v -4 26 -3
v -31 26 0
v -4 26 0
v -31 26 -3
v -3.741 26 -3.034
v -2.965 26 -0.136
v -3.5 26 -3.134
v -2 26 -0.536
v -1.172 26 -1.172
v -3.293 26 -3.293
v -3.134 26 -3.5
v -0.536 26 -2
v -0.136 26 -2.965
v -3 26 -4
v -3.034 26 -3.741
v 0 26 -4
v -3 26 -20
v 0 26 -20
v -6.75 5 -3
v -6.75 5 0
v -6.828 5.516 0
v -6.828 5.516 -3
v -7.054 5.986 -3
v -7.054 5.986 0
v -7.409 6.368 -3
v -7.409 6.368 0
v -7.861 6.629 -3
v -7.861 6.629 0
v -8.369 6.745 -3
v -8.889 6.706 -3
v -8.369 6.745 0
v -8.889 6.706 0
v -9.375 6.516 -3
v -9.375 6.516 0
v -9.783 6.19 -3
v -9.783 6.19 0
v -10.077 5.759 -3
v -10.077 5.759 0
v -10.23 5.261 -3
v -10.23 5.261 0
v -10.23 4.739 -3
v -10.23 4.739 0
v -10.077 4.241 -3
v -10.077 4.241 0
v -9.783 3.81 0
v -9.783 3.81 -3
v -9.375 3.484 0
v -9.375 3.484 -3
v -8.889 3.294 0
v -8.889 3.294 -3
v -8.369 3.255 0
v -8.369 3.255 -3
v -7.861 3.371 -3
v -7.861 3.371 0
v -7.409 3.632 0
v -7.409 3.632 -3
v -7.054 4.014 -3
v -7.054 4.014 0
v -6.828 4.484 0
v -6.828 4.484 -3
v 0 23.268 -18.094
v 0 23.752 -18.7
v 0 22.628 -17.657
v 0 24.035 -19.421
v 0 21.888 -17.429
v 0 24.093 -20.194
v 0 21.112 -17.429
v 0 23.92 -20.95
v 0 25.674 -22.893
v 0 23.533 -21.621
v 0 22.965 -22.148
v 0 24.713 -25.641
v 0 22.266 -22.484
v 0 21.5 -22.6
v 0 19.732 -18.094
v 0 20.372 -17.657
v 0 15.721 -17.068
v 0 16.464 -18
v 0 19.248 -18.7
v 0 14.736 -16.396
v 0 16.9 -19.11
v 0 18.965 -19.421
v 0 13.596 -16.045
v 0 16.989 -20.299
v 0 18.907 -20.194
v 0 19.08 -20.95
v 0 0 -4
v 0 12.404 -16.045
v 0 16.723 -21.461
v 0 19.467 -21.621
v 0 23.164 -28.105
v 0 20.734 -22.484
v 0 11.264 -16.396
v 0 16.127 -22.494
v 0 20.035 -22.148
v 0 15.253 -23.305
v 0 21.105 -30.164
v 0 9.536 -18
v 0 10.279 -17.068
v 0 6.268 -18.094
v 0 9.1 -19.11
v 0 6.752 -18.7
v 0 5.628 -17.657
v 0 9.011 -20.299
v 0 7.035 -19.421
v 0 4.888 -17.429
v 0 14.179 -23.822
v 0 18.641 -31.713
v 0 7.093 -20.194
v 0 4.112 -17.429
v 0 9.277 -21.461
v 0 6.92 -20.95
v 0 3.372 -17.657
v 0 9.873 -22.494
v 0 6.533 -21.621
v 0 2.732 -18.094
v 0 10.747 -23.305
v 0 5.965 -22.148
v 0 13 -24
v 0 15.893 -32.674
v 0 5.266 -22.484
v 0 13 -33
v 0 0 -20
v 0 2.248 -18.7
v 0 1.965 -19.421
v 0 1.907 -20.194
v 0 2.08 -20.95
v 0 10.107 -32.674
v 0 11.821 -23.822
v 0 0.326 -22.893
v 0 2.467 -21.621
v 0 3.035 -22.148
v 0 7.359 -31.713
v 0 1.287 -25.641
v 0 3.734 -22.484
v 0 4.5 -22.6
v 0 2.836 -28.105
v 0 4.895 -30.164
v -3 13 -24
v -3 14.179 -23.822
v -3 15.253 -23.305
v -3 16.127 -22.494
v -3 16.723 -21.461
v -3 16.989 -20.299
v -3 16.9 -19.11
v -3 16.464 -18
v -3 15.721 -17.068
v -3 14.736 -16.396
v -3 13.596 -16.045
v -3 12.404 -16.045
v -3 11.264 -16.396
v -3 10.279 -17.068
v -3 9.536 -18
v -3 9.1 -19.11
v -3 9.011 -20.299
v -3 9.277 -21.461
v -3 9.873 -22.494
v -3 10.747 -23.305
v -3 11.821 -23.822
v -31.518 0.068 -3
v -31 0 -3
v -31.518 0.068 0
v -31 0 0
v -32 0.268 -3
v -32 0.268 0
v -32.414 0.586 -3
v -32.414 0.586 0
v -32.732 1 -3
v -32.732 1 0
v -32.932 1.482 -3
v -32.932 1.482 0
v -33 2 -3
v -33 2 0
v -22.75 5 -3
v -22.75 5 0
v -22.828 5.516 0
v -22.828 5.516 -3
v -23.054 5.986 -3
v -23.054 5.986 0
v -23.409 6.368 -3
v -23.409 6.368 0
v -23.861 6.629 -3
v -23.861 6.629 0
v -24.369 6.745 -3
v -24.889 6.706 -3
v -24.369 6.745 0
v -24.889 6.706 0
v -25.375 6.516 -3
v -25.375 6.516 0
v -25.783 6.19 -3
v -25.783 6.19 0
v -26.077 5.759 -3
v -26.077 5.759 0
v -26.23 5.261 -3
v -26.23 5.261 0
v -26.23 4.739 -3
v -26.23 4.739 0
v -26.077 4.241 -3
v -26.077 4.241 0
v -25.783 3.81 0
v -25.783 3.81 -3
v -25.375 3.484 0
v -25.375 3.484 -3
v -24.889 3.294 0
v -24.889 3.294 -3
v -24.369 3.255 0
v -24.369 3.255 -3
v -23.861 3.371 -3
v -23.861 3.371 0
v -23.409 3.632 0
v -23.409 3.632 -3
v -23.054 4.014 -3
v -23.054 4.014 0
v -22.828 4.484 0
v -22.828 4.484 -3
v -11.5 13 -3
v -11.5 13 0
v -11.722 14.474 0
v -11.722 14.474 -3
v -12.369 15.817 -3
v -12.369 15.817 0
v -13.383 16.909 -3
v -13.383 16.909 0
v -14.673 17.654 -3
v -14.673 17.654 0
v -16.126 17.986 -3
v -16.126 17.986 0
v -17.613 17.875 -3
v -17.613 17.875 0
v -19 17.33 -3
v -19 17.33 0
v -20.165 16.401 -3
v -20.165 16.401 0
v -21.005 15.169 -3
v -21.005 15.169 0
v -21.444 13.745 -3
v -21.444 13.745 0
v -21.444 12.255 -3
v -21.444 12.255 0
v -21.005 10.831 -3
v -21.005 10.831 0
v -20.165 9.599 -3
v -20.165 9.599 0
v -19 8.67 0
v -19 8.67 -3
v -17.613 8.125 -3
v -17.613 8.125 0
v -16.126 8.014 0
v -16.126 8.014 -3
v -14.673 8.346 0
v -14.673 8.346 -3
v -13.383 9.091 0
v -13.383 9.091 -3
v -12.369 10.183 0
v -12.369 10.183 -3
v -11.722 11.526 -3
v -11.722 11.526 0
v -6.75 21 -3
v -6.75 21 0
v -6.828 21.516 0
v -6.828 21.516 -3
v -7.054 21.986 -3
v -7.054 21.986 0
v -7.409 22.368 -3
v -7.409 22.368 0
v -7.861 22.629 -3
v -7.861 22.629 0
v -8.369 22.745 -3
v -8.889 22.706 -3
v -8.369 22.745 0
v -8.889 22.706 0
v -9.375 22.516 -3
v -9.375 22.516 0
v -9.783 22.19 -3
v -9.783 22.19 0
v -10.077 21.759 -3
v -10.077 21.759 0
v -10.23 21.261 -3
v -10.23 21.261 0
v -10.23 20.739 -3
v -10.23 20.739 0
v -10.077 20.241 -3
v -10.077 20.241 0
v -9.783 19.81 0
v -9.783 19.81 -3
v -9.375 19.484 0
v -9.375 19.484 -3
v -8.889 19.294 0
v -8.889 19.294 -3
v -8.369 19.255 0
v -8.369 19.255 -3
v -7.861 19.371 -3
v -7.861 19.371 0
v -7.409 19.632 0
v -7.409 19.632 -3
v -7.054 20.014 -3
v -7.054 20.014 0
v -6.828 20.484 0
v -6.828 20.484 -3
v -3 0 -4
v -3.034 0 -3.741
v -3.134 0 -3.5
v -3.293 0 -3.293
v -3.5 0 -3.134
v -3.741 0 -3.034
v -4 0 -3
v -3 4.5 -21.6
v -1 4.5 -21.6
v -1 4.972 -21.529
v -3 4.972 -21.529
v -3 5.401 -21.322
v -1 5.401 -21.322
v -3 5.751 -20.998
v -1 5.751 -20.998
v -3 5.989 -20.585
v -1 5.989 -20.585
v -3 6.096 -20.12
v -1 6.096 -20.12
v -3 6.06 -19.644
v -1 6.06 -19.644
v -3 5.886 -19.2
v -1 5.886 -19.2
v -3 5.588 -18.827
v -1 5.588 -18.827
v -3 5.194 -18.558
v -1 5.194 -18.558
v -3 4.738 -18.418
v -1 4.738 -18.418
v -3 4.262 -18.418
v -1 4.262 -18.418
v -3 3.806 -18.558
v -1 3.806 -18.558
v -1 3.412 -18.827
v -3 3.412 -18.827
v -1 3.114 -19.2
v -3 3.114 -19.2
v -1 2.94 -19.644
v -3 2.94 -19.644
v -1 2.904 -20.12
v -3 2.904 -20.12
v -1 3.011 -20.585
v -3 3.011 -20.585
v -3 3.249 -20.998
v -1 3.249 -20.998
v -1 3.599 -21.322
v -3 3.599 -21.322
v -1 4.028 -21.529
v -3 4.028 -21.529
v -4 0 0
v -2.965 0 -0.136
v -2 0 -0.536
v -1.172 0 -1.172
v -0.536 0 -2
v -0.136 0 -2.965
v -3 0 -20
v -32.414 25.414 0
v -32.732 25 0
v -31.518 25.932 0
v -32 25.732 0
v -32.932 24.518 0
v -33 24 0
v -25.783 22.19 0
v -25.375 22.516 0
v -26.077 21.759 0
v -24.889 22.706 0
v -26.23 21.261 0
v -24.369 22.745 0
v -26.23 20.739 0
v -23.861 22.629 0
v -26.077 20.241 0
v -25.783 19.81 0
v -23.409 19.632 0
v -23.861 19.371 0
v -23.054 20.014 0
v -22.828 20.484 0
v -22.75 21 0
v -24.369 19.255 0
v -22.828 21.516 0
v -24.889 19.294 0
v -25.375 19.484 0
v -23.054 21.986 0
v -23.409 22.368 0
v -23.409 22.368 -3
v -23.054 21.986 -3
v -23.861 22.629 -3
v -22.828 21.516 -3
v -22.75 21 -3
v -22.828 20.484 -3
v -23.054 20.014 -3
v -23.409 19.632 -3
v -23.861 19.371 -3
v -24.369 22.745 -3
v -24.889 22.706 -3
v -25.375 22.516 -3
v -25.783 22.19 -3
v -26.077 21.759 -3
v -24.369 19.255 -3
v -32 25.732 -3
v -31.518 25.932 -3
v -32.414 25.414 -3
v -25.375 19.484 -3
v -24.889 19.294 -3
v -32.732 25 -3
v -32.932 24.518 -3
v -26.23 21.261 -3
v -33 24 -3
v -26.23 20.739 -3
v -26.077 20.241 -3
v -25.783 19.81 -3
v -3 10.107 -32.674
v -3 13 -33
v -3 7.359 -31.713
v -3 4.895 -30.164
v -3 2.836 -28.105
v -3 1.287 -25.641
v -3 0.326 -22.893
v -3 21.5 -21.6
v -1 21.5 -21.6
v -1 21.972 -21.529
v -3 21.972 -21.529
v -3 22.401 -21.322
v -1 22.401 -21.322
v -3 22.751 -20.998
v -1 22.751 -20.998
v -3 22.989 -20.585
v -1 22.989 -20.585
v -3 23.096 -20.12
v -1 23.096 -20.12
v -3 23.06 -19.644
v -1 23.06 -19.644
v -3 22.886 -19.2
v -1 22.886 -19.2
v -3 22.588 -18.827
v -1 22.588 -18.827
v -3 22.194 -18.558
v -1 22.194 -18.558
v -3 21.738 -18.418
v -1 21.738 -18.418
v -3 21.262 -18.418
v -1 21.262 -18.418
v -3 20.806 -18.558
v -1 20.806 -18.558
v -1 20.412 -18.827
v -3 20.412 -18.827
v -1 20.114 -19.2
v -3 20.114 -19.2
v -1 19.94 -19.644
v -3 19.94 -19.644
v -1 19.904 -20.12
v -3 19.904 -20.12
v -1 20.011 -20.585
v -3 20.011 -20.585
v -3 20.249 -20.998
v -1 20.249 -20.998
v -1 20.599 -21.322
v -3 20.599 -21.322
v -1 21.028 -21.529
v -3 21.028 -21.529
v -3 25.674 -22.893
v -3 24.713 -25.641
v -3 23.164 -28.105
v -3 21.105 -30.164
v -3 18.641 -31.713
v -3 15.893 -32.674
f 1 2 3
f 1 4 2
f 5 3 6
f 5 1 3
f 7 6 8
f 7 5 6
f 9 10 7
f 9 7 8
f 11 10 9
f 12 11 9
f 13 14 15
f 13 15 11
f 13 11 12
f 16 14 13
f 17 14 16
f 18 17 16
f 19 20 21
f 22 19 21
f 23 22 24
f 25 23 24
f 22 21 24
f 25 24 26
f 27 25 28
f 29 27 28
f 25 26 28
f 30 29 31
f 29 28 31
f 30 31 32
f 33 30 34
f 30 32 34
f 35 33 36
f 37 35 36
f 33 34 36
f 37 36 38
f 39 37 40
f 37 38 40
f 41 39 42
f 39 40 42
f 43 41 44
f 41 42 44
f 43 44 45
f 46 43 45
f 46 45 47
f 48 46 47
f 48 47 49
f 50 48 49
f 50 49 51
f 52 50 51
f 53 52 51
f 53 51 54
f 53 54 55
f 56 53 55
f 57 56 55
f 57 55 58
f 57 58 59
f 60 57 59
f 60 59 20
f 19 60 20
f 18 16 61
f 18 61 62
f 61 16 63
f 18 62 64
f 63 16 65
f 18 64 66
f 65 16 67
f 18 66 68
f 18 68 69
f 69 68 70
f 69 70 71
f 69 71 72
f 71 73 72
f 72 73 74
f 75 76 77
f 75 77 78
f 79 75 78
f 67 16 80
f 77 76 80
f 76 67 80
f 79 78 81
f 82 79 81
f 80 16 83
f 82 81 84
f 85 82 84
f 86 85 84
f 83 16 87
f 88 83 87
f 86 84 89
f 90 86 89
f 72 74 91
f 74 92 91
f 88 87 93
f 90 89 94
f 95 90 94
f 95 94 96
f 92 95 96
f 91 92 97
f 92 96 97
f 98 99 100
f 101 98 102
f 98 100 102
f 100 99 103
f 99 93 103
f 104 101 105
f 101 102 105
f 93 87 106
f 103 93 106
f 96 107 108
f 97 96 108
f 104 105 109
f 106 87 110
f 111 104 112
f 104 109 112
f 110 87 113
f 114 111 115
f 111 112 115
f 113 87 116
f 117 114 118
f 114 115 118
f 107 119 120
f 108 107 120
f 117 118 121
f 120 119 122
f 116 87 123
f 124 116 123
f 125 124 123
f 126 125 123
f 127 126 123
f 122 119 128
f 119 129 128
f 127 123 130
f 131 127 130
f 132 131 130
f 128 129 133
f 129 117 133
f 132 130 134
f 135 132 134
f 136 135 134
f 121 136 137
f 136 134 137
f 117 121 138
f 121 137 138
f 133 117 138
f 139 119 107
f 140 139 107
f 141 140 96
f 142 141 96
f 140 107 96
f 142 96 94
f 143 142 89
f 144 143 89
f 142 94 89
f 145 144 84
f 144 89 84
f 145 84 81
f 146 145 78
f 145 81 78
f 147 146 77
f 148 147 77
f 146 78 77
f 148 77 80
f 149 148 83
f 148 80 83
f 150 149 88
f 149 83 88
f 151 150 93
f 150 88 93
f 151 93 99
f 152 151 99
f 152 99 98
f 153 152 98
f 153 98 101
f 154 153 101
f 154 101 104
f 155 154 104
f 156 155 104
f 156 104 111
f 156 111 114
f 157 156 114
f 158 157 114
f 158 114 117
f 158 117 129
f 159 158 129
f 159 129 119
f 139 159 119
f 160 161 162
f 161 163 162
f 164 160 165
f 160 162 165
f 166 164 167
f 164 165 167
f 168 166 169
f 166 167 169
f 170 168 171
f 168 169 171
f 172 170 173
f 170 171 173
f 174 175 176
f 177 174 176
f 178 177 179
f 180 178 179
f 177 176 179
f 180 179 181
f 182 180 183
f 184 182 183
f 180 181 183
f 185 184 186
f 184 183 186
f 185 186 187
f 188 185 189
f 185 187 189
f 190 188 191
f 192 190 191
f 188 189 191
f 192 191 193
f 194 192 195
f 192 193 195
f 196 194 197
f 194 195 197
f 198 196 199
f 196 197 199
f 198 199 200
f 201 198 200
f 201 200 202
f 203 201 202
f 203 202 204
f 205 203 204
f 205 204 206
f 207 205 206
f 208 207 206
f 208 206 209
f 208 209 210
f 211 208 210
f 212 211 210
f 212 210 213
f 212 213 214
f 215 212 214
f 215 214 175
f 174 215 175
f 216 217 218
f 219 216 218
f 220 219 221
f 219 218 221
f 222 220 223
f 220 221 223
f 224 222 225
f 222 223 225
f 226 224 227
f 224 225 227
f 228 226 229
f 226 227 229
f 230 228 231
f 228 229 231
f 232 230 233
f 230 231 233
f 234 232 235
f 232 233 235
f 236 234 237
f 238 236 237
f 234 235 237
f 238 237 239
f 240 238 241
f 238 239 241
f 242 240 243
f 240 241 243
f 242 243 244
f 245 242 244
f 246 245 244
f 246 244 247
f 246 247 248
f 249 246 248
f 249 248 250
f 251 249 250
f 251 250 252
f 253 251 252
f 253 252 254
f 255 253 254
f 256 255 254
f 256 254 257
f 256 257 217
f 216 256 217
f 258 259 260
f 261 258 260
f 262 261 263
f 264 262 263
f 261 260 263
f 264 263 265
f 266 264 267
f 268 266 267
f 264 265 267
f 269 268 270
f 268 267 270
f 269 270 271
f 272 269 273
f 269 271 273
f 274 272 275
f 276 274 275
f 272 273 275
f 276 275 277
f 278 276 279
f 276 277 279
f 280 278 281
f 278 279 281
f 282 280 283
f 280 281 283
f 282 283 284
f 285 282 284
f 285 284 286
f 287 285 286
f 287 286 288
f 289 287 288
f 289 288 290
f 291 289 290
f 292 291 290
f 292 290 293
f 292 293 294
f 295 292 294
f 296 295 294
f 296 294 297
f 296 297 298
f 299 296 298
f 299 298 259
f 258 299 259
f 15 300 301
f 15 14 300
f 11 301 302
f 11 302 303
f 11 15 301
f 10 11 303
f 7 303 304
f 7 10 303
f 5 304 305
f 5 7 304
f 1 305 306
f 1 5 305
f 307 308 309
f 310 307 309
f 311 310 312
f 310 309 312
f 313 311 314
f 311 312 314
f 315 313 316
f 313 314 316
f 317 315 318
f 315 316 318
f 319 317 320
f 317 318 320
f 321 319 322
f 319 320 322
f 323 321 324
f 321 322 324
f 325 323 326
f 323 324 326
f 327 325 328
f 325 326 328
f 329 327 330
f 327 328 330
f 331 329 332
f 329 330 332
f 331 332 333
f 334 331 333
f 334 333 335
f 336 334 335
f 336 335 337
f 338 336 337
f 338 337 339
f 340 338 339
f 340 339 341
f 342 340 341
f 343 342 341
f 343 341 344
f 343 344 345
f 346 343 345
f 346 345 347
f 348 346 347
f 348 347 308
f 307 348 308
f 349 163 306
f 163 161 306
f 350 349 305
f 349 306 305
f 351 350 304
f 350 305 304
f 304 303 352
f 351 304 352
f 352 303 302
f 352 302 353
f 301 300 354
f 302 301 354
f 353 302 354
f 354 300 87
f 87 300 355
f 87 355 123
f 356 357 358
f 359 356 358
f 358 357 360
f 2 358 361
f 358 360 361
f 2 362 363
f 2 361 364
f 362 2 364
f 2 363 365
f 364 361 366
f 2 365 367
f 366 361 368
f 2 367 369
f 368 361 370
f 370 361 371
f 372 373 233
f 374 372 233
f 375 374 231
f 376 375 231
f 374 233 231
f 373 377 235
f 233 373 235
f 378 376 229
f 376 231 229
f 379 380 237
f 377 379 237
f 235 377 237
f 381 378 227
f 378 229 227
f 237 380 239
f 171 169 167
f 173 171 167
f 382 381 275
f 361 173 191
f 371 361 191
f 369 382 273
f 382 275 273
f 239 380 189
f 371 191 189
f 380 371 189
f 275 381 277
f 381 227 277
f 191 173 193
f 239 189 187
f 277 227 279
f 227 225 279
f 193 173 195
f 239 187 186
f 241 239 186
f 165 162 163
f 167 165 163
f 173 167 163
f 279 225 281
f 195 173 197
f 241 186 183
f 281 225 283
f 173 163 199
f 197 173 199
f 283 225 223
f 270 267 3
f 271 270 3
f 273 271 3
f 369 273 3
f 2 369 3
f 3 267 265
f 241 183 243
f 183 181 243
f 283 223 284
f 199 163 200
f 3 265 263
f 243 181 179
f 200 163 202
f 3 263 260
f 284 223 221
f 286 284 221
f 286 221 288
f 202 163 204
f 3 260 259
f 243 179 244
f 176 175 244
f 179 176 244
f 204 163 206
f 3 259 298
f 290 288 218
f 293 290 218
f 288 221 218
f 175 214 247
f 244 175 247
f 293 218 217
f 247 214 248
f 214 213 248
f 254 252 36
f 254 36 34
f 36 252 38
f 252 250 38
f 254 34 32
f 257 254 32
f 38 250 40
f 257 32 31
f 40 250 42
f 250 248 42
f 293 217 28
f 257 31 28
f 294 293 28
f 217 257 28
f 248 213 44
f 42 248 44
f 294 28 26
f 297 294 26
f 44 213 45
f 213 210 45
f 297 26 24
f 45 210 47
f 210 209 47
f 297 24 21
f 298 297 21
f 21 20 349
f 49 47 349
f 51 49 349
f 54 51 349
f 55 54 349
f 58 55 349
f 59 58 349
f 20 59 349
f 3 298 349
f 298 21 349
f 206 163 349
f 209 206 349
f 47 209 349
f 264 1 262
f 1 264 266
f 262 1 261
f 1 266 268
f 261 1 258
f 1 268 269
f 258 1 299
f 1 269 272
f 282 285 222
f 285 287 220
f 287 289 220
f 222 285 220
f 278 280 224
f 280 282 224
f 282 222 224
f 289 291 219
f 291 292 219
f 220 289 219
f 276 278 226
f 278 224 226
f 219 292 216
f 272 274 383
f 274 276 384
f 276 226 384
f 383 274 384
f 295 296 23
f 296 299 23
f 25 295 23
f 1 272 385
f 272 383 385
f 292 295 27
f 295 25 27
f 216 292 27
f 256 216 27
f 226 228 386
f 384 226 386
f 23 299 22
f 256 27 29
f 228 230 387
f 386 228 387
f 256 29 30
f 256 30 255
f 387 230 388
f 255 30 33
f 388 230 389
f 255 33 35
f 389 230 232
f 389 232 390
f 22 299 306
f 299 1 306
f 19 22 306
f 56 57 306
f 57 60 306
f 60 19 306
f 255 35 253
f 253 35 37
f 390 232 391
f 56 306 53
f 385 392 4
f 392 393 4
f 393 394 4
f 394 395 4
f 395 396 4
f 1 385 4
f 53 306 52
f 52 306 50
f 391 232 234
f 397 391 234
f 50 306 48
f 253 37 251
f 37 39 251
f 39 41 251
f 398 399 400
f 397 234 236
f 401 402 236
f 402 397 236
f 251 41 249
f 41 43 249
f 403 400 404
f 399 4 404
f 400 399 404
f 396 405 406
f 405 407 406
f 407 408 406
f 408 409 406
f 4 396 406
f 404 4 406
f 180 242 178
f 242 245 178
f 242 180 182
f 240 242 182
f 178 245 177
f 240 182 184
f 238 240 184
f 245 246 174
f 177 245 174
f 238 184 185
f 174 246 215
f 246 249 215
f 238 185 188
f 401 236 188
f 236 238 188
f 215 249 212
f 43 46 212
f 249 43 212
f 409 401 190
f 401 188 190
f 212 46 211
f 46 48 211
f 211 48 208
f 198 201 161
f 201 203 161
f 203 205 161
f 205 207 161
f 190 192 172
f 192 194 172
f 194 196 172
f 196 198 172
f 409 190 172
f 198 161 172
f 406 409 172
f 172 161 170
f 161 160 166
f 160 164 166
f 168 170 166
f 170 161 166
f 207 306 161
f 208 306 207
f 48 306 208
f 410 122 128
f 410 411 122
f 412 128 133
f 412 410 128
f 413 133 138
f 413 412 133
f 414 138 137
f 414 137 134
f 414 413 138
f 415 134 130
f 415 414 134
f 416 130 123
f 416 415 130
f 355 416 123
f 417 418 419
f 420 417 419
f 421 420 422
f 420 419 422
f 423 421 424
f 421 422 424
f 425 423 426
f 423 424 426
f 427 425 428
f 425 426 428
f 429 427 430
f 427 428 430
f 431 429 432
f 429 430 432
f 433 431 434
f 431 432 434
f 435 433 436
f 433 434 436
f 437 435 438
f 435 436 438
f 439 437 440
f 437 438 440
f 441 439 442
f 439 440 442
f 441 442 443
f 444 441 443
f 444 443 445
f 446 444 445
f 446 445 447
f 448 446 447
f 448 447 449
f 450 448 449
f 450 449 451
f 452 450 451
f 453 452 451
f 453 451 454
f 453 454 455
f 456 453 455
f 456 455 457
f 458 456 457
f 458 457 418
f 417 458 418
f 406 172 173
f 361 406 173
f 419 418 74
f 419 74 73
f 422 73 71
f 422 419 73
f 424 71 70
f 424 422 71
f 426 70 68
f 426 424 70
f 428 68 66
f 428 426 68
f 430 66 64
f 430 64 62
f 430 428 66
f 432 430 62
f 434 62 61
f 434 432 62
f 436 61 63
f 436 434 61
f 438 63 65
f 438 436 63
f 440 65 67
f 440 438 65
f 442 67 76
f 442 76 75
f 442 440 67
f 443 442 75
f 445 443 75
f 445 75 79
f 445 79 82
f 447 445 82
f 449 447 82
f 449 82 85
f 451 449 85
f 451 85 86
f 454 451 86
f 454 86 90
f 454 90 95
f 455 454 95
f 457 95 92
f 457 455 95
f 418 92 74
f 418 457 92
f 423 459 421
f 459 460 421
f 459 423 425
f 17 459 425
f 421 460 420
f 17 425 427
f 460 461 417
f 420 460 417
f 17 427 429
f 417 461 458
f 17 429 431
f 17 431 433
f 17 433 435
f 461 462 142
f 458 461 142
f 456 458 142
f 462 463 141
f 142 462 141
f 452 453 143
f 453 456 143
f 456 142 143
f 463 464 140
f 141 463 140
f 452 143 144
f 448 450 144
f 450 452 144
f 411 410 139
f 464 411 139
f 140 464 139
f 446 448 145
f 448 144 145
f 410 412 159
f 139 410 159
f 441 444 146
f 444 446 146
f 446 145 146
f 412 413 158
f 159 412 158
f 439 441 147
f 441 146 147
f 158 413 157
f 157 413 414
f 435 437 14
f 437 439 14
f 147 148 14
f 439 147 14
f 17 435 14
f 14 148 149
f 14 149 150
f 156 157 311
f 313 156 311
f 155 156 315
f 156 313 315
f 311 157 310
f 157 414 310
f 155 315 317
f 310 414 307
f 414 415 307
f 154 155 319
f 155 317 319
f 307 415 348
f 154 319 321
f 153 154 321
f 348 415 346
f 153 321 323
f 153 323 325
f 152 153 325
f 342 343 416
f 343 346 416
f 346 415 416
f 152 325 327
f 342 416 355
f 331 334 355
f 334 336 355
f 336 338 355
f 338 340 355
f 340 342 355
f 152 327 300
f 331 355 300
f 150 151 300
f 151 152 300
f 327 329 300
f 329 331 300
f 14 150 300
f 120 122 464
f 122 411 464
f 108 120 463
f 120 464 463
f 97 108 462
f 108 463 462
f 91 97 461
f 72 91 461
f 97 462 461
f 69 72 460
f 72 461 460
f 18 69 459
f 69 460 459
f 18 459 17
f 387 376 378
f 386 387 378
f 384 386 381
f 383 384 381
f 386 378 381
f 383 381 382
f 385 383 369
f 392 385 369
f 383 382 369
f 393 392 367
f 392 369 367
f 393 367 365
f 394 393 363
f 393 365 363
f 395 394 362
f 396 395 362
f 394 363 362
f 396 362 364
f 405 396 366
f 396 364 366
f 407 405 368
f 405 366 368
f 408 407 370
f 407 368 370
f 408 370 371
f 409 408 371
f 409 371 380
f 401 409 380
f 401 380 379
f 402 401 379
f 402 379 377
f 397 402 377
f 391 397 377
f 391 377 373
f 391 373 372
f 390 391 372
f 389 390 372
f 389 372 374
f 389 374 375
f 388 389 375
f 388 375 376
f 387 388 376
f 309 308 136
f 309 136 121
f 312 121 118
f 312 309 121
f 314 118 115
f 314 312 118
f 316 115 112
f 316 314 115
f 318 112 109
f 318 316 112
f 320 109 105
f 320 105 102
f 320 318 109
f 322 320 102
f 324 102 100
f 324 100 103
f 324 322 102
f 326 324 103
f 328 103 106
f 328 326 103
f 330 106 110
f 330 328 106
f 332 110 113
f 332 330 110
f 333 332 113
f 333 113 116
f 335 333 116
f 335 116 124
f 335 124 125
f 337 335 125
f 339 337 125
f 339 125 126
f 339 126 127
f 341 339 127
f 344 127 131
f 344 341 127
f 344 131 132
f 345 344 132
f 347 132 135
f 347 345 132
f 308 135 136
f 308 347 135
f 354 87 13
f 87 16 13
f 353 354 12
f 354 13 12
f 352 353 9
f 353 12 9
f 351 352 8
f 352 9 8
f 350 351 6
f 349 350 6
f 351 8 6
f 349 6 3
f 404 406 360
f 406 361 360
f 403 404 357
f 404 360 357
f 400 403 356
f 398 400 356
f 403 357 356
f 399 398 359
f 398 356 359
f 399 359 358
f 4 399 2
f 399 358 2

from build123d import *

# Parameters (mm, degrees)
BOSS_EXTRUDE1_DEPTH = 26
SKETCH2_R           = 5
SKETCH2_R_2         = 1.75
CUT_EXTRUDE1_DEPTH  = 26
FILLET1_R           = 13
SKETCH4_R           = 4
SKETCH4_R_2         = 1.6
CUT_EXTRUDE2_DEPTH  = 26
FILLET2_R           = 1
FILLET3_R           = 4
FILLET4_R           = 2
CHAMFER1_SIZE       = 1


with BuildPart() as part:
    # Sketch1 → Boss-Extrude1 (new body)
    with BuildSketch(Plane(origin=(0, 0, 0), x_dir=(1, 0, 0), z_dir=(0, 1, 0))):
        Polygon((0, 0), (0, 33), (-3, 33), (-3, 3), (-33, 3), (-33, 0), align=None)
    extrude(amount=BOSS_EXTRUDE1_DEPTH)

    # Sketch2 → Cut-Extrude1 (cut)
    with BuildSketch(Plane.XY):
        with Locations((-16.5, 13)):
            Circle(SKETCH2_R)
        with Locations((-24.5, 21)):
            Circle(SKETCH2_R_2)
        with Locations((-8.5, 21)):
            Circle(SKETCH2_R_2)
        with Locations((-8.5, 5)):
            Circle(SKETCH2_R_2)
        with Locations((-24.5, 5)):
            Circle(SKETCH2_R_2)
    extrude(amount=-CUT_EXTRUDE1_DEPTH, mode=Mode.SUBTRACT)

    # Fillet1
    fillet1_edges = [part.edges().sort_by_distance(p)[0] for p in [
        (-1.5, 0, -33),
        (-1.5, 26, -33),
    ]]
    fillet(fillet1_edges, radius=FILLET1_R - 0.0001)  # a hair under: the kernel refuses the full size

    # Sketch4 → Cut-Extrude2 (cut)
    with BuildSketch(Plane(origin=(0, 0, 0), x_dir=(0, 0, -1), z_dir=(1, 0, 0))):
        with Locations((20, 13)):
            Circle(SKETCH4_R)
        with Locations((20, 21.5)):
            Circle(SKETCH4_R_2)
        with Locations((20, 4.5)):
            Circle(SKETCH4_R_2)
    extrude(amount=-CUT_EXTRUDE2_DEPTH, mode=Mode.SUBTRACT)

    # Fillet2
    fillet2_edges = [part.edges().sort_by_distance(p)[0] for p in [
        (-3, 13, -3),
    ]]
    fillet(fillet2_edges, radius=FILLET2_R)

    # Fillet3
    fillet3_edges = [part.edges().sort_by_distance(p)[0] for p in [
        (0, 13, 0),
    ]]
    fillet(fillet3_edges, radius=FILLET3_R)

    # Fillet4
    fillet4_edges = [part.edges().sort_by_distance(p)[0] for p in [
        (-33, 26, -1.5),
        (-33, 0, -1.5),
    ]]
    fillet(fillet4_edges, radius=FILLET4_R)

    # Chamfer1
    chamfer1_edges = [part.edges().sort_by_distance(p)[0] for p in [
        (0, 4.5, -18.4),
        (0, 21.5, -18.4),
    ]]
    chamfer(chamfer1_edges, length=CHAMFER1_SIZE)


solid = part.part
